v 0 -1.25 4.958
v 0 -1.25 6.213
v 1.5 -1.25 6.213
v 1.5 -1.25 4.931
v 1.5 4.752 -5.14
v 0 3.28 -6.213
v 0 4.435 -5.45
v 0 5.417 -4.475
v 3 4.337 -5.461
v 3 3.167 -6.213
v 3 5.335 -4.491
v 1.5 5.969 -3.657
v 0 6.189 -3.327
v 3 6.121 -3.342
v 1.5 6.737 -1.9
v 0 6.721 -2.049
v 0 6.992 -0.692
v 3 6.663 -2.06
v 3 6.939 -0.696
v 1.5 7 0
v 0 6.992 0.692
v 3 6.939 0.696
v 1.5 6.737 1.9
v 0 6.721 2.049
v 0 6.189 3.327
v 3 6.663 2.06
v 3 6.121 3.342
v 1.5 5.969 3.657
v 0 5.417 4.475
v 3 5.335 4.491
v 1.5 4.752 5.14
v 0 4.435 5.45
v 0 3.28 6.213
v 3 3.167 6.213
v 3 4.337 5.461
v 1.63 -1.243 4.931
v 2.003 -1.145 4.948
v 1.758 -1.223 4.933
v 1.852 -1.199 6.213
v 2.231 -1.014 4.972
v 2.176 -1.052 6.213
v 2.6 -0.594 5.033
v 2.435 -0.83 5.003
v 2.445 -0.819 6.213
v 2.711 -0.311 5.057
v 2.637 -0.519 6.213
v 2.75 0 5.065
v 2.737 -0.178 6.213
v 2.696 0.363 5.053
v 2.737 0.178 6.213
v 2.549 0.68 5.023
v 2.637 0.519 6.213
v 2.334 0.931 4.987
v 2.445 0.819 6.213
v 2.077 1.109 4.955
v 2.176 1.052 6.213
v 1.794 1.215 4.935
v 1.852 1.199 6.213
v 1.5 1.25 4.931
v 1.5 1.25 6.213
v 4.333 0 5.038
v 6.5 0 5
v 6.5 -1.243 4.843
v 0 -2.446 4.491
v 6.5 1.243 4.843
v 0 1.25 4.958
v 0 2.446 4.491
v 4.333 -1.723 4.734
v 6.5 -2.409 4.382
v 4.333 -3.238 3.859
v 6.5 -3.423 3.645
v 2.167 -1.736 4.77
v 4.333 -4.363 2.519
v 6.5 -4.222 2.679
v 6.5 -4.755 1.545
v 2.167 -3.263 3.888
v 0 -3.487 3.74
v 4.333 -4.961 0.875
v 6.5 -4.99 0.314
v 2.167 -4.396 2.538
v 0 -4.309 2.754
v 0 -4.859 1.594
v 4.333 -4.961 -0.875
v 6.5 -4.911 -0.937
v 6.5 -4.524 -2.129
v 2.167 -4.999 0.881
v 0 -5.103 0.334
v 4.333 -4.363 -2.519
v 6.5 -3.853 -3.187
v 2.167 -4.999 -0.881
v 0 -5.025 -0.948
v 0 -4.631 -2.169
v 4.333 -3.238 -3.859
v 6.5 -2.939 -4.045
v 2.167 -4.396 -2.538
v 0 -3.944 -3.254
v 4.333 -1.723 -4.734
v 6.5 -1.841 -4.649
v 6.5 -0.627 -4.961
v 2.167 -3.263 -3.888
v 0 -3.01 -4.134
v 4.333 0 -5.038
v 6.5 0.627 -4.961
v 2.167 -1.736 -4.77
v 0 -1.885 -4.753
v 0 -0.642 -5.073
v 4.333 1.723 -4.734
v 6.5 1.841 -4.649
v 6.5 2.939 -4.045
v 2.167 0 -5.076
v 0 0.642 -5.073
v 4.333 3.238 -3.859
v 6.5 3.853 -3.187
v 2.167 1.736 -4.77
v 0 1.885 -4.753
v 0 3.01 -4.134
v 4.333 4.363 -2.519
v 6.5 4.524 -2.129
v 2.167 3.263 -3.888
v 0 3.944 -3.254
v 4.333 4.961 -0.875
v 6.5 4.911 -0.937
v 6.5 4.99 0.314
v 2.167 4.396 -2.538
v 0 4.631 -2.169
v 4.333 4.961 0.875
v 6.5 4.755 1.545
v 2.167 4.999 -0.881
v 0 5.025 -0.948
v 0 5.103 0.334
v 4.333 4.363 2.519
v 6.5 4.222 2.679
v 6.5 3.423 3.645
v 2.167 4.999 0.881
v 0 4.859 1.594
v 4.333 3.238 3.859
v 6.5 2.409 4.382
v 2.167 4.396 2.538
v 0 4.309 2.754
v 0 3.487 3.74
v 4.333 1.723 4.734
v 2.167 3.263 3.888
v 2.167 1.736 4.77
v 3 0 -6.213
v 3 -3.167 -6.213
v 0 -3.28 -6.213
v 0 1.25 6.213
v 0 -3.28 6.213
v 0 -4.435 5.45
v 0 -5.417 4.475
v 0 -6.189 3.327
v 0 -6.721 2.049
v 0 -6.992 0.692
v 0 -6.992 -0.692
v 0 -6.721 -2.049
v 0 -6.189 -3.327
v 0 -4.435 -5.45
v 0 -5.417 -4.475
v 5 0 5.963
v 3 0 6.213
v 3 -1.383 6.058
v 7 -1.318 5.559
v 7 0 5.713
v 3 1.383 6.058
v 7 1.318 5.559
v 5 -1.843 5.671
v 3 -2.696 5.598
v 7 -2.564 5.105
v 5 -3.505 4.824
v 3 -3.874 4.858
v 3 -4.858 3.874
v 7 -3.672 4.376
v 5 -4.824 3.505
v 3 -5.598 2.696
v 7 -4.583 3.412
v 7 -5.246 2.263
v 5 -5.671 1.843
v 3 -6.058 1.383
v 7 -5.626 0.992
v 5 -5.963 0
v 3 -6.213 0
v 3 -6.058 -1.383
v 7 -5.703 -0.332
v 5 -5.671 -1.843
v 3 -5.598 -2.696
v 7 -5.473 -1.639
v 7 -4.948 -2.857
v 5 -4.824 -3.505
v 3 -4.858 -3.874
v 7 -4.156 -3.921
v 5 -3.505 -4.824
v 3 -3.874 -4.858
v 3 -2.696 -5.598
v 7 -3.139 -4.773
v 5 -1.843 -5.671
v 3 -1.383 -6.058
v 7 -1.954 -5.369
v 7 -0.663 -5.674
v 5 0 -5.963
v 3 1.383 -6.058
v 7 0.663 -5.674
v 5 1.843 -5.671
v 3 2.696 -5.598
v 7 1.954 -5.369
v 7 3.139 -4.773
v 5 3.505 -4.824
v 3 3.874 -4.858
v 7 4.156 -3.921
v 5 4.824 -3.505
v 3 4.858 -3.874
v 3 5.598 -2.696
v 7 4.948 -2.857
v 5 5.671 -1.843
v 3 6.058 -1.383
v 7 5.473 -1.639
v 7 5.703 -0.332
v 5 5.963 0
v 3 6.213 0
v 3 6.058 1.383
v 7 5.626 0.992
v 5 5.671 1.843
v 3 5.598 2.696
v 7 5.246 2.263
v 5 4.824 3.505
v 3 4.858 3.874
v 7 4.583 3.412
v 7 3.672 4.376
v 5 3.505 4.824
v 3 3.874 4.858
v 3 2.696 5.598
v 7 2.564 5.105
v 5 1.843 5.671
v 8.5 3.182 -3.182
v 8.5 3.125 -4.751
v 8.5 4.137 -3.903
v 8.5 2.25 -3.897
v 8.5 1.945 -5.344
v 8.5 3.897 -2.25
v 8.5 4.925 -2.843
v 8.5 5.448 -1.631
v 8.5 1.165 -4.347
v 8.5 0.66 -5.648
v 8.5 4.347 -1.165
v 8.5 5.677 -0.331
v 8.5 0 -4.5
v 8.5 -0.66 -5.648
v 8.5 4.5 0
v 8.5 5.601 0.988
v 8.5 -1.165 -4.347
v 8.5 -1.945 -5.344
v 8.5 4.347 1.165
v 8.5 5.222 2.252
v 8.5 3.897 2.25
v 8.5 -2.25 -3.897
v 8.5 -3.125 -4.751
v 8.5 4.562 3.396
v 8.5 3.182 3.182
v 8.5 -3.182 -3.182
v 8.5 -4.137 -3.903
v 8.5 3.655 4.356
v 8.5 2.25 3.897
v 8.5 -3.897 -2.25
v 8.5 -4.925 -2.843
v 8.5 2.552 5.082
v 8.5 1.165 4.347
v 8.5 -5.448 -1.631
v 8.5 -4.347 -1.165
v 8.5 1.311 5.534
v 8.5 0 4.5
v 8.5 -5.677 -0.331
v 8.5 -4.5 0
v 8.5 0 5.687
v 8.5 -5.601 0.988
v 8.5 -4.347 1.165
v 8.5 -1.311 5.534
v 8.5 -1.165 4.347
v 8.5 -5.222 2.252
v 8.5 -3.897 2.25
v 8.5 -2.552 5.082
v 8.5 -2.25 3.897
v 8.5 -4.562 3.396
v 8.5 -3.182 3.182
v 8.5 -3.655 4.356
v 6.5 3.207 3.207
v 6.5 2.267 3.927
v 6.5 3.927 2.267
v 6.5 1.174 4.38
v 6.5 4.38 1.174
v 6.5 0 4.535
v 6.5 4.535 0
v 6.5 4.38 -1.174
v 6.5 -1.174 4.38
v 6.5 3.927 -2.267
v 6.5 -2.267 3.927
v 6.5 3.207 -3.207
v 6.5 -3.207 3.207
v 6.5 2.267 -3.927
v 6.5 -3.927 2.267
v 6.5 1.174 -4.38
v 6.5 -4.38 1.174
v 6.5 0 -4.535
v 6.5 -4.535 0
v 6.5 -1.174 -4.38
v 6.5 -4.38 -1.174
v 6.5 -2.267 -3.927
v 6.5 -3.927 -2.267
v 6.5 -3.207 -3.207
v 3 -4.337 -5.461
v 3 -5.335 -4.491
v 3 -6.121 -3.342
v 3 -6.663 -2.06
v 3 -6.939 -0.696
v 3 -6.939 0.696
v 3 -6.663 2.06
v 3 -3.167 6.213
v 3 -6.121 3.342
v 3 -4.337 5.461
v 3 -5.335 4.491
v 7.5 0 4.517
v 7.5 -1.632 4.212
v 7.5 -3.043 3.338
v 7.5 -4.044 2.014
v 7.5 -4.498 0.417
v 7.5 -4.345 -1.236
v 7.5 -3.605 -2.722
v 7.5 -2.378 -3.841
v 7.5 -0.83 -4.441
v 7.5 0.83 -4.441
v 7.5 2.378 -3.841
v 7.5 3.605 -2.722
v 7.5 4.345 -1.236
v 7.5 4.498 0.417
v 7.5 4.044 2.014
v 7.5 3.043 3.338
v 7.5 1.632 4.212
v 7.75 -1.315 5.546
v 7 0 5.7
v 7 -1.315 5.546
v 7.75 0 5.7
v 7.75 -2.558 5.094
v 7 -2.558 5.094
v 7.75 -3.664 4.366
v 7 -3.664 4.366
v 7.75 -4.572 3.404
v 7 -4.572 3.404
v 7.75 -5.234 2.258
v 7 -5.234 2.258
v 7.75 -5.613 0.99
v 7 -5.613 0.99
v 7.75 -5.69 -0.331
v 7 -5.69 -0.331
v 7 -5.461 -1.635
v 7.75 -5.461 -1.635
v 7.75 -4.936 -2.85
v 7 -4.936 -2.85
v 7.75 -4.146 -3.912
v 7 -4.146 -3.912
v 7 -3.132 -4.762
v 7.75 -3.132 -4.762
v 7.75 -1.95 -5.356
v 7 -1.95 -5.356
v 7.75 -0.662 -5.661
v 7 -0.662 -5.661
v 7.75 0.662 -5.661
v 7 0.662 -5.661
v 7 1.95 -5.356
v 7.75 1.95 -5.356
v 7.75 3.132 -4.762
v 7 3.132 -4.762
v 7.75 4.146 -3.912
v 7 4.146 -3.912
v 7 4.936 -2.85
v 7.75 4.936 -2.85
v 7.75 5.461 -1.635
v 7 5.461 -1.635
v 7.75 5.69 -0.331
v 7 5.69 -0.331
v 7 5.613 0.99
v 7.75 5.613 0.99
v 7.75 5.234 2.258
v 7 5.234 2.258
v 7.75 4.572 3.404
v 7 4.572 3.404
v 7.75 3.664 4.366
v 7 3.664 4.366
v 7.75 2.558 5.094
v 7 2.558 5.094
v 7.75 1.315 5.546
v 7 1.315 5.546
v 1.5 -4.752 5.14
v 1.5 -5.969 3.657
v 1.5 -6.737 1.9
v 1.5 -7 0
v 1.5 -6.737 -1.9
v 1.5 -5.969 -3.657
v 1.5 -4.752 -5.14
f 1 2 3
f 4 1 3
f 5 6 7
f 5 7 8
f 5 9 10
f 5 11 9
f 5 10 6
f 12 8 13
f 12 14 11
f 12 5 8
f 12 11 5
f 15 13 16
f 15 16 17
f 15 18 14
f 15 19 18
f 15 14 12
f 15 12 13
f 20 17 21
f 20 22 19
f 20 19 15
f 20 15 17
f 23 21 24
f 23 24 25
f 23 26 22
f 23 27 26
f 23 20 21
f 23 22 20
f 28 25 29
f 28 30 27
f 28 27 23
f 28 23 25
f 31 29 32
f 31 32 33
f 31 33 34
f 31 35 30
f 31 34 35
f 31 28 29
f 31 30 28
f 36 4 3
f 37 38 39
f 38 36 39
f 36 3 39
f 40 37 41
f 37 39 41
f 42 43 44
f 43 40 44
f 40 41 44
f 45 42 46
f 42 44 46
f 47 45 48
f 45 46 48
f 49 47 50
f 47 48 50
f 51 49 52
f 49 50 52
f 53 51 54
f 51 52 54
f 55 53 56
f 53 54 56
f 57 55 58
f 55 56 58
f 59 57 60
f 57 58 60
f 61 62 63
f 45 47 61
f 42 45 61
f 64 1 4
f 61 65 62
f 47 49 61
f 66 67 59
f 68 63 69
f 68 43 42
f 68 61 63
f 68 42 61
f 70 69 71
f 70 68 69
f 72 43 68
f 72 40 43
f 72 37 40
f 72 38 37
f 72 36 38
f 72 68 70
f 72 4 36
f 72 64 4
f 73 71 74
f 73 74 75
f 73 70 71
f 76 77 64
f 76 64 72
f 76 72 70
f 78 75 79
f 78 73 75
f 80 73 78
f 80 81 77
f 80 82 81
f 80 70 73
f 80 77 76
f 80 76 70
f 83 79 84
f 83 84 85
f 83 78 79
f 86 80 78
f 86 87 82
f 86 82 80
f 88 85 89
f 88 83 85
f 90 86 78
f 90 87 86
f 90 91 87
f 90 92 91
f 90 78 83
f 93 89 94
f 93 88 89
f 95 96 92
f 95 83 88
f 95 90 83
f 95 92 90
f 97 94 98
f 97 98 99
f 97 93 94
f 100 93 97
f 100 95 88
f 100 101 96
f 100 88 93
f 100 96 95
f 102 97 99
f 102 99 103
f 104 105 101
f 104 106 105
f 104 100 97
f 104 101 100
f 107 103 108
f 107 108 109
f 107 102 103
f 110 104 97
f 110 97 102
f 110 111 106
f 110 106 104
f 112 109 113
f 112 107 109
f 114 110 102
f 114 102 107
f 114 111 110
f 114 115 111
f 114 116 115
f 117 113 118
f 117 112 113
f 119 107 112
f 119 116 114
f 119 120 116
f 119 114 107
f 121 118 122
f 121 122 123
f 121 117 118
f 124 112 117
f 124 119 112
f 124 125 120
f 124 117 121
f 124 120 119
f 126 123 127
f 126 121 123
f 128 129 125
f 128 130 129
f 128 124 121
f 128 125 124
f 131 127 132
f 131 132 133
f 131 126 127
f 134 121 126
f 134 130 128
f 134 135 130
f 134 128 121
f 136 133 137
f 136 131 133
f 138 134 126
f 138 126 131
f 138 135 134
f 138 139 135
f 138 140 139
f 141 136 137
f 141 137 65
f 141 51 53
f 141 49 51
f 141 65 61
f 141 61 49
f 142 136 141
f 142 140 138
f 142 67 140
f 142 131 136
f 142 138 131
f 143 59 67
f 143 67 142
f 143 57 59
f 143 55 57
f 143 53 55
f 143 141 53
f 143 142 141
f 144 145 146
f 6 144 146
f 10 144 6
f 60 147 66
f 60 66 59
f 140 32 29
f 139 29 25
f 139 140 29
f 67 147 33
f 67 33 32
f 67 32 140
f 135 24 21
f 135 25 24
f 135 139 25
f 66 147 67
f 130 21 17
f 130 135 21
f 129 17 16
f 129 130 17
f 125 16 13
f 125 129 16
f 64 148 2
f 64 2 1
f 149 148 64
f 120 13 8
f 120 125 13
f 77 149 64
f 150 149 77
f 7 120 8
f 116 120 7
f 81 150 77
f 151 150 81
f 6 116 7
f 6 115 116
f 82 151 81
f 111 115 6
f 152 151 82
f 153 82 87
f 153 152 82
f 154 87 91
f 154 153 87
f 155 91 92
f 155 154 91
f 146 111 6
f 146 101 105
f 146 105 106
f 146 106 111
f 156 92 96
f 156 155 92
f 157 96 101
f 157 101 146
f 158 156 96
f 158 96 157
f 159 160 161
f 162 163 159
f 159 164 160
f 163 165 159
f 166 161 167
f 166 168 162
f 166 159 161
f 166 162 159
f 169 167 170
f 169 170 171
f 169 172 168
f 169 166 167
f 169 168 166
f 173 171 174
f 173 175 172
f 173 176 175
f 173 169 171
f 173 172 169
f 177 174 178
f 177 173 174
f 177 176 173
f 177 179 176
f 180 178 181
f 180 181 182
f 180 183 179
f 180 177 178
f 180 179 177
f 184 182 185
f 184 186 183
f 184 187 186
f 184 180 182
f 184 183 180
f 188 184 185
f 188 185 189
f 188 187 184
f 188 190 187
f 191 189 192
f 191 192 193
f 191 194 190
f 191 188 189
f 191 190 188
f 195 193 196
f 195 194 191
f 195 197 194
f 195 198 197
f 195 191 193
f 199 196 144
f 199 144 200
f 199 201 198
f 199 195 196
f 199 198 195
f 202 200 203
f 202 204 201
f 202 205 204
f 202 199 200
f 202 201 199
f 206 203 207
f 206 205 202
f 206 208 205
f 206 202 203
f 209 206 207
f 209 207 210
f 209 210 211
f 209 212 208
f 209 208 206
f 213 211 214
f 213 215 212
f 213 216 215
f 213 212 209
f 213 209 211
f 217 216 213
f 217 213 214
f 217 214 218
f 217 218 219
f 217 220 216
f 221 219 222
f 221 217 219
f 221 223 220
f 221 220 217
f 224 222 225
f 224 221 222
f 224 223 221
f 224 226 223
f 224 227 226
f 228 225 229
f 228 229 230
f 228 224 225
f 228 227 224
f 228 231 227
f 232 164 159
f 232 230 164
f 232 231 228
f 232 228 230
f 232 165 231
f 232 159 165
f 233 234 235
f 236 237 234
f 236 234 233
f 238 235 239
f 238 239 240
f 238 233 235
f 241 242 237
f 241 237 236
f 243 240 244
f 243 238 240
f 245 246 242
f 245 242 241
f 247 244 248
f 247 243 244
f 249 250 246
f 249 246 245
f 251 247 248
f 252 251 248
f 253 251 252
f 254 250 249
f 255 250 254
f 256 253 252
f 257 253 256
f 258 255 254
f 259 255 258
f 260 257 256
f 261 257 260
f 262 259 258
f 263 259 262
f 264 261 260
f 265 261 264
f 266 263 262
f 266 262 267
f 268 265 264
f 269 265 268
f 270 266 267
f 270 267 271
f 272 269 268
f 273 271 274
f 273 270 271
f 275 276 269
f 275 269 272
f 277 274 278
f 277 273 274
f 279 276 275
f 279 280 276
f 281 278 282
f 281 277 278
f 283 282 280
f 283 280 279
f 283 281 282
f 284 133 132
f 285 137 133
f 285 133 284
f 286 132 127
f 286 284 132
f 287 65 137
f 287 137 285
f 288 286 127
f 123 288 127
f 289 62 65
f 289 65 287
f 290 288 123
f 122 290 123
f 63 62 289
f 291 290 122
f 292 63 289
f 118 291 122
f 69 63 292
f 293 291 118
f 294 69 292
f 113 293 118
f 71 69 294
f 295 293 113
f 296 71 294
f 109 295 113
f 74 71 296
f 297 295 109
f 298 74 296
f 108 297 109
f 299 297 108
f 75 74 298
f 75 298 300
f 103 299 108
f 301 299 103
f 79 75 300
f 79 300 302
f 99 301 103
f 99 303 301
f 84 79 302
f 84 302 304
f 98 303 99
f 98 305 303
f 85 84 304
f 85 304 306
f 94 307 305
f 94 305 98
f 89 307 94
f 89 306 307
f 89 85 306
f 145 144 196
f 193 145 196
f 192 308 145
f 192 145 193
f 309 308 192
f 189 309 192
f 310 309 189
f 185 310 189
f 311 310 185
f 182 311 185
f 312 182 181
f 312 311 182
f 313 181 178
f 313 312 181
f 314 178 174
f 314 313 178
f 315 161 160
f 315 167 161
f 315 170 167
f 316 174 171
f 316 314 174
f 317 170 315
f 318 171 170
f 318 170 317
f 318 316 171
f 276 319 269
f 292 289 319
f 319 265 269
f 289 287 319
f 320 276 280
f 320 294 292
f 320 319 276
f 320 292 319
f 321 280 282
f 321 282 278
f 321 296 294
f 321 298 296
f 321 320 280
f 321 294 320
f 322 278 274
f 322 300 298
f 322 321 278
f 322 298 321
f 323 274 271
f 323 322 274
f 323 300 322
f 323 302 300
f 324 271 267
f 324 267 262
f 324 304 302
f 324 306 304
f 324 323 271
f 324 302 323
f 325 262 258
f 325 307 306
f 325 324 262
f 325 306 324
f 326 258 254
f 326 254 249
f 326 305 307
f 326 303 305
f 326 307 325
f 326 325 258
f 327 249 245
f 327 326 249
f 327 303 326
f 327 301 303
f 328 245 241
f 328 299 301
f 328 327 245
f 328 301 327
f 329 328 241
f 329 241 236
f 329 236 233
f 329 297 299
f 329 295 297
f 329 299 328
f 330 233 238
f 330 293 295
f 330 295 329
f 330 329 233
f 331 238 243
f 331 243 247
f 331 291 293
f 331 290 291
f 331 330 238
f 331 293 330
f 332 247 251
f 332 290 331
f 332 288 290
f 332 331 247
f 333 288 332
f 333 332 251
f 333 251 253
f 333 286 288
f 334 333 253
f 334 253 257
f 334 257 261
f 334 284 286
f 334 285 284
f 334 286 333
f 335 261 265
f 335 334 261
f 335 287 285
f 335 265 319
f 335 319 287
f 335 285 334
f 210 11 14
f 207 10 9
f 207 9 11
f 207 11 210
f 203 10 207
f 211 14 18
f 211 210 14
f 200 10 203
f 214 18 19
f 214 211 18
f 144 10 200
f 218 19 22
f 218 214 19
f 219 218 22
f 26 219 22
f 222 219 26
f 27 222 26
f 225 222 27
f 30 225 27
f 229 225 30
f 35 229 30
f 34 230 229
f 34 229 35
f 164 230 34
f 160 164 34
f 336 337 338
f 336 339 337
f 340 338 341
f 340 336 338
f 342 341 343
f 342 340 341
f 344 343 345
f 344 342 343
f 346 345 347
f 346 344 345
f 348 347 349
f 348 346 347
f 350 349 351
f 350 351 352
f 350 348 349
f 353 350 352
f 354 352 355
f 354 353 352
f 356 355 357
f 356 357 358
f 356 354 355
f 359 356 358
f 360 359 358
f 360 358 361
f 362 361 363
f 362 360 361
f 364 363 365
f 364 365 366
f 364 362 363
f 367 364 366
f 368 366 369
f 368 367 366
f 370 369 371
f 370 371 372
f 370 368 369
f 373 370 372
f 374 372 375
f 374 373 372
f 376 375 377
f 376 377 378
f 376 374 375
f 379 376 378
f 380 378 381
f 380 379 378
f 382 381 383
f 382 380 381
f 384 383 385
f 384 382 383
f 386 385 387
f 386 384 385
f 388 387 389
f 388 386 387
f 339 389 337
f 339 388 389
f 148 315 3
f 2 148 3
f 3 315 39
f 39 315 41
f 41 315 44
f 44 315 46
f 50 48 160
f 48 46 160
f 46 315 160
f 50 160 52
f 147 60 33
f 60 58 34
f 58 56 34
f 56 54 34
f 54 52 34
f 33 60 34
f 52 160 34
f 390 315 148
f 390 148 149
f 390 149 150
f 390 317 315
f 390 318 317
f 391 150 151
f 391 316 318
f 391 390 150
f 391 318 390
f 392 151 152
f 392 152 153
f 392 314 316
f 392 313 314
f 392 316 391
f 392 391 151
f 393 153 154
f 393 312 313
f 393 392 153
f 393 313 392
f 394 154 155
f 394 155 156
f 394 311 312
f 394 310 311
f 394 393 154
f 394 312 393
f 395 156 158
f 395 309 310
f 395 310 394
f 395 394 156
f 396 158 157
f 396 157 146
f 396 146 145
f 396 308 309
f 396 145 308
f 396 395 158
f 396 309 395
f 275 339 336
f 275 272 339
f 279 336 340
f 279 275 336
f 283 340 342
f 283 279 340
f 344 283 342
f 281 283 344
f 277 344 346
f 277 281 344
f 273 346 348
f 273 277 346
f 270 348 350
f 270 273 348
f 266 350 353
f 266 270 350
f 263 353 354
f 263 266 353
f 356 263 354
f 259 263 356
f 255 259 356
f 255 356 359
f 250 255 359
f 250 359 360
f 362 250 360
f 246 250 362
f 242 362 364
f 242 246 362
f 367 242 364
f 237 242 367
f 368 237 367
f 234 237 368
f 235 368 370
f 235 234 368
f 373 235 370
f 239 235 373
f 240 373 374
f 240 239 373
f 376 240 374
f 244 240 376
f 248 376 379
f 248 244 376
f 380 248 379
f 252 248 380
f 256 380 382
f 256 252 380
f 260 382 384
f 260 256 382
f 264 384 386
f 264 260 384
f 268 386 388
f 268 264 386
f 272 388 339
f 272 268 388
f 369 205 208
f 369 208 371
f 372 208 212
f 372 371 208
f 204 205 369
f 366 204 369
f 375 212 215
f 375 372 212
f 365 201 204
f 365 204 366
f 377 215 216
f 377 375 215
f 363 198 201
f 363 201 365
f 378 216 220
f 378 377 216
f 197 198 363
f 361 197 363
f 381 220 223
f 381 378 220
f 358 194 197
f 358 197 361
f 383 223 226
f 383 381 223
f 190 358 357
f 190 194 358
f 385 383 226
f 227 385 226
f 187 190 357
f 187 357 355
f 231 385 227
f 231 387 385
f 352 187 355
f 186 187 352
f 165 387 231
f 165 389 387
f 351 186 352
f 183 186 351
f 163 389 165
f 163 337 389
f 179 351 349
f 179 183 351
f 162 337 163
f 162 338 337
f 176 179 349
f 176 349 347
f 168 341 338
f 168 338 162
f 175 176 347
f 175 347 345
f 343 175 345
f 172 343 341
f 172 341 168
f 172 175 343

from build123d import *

# Parameters (mm, degrees)
SKETCH_2_W          = 4.013970818
SKETCH_2_H          = 10.71622578
SKETCH_2_W_2        = 3.089760279
SKETCH_2_H_2        = 12.863028926
CUT_EXTRUDE_1_DEPTH = 4
CUT_EXTRUDE_2_REACH = 14.427
SKETCH_3_R          = 1.25
SKETCH_3_W          = 1.5
SKETCH_3_H          = 2.5


with BuildPart() as part:
    # 草图1 → 旋转1 (revolve)
    with BuildSketch(Plane.XY, mode=Mode.PRIVATE) as revolve_1_sk:
        Polygon((7, -5.713091299), (7, -5.7), (7.75, -5.7), (8.5, -5.686908701), (8.5, -4.5), (6.5, -4.53491013), (6.5, -5), (0, -5.113457922), (0, -7.026182597), (3, -6.973817403), (3, -6.213444663), align=None)
    revolve(revolve_1_sk.sketch.rotate(Axis((-162.804450563, 0, 0), (1, 0, 0)), 270), axis=Axis((-162.804450563, 0, 0), (1, 0, 0)))  # turned: the seam where the file's is

    # 草图2 → 切除-拉伸1 (cut, through all)
    with BuildSketch(Plane(origin=(3, 0, 0), x_dir=(0, 0, -1), z_dir=(1, 0, 0))):
        with Locations((8.220430072, 0.592212477)):
            Rectangle(SKETCH_2_W, SKETCH_2_H)
        with Locations((-7.758324803, -0.481189096)):
            Rectangle(SKETCH_2_W_2, SKETCH_2_H_2)
    extrude(amount=-CUT_EXTRUDE_1_DEPTH, mode=Mode.SUBTRACT)

    # 切除-拉伸2: up to this cone (the profile starts outside it)
    cut_extrude_2_end = Plane(origin=(1.125, 0, 0), z_dir=(-1, 0, 0)) * Cone(4.737810595, 5.449831353, 40.791641948, mode=Mode.PRIVATE)
    # 草图3 → 切除-拉伸2 (cut, up to the surface)
    with BuildSketch(Plane.XY.offset(6.213444663), mode=Mode.PRIVATE) as cut_extrude_2_sk1:
        with Locations((1.5, 0)):
            Circle(SKETCH_3_R)
    cut_extrude_2_tool1 = extrude(cut_extrude_2_sk1.sketch, amount=-CUT_EXTRUDE_2_REACH, mode=Mode.PRIVATE) - cut_extrude_2_end
    add(cut_extrude_2_tool1.solids().sort_by_distance((1.5, 0, 6.213445))[0], mode=Mode.SUBTRACT)
    # 草图3 → 切除-拉伸2 (cut, up to the surface)
    with BuildSketch(Plane.XY.offset(6.213444663), mode=Mode.PRIVATE) as cut_extrude_2_sk2:
        with Locations((0.75, 0)):
            Rectangle(SKETCH_3_W, SKETCH_3_H)
    cut_extrude_2_tool2 = extrude(cut_extrude_2_sk2.sketch, amount=-CUT_EXTRUDE_2_REACH, mode=Mode.PRIVATE) - cut_extrude_2_end
    add(cut_extrude_2_tool2.solids().sort_by_distance((0.75, 0, 6.213445))[0], mode=Mode.SUBTRACT)


solid = part.part
